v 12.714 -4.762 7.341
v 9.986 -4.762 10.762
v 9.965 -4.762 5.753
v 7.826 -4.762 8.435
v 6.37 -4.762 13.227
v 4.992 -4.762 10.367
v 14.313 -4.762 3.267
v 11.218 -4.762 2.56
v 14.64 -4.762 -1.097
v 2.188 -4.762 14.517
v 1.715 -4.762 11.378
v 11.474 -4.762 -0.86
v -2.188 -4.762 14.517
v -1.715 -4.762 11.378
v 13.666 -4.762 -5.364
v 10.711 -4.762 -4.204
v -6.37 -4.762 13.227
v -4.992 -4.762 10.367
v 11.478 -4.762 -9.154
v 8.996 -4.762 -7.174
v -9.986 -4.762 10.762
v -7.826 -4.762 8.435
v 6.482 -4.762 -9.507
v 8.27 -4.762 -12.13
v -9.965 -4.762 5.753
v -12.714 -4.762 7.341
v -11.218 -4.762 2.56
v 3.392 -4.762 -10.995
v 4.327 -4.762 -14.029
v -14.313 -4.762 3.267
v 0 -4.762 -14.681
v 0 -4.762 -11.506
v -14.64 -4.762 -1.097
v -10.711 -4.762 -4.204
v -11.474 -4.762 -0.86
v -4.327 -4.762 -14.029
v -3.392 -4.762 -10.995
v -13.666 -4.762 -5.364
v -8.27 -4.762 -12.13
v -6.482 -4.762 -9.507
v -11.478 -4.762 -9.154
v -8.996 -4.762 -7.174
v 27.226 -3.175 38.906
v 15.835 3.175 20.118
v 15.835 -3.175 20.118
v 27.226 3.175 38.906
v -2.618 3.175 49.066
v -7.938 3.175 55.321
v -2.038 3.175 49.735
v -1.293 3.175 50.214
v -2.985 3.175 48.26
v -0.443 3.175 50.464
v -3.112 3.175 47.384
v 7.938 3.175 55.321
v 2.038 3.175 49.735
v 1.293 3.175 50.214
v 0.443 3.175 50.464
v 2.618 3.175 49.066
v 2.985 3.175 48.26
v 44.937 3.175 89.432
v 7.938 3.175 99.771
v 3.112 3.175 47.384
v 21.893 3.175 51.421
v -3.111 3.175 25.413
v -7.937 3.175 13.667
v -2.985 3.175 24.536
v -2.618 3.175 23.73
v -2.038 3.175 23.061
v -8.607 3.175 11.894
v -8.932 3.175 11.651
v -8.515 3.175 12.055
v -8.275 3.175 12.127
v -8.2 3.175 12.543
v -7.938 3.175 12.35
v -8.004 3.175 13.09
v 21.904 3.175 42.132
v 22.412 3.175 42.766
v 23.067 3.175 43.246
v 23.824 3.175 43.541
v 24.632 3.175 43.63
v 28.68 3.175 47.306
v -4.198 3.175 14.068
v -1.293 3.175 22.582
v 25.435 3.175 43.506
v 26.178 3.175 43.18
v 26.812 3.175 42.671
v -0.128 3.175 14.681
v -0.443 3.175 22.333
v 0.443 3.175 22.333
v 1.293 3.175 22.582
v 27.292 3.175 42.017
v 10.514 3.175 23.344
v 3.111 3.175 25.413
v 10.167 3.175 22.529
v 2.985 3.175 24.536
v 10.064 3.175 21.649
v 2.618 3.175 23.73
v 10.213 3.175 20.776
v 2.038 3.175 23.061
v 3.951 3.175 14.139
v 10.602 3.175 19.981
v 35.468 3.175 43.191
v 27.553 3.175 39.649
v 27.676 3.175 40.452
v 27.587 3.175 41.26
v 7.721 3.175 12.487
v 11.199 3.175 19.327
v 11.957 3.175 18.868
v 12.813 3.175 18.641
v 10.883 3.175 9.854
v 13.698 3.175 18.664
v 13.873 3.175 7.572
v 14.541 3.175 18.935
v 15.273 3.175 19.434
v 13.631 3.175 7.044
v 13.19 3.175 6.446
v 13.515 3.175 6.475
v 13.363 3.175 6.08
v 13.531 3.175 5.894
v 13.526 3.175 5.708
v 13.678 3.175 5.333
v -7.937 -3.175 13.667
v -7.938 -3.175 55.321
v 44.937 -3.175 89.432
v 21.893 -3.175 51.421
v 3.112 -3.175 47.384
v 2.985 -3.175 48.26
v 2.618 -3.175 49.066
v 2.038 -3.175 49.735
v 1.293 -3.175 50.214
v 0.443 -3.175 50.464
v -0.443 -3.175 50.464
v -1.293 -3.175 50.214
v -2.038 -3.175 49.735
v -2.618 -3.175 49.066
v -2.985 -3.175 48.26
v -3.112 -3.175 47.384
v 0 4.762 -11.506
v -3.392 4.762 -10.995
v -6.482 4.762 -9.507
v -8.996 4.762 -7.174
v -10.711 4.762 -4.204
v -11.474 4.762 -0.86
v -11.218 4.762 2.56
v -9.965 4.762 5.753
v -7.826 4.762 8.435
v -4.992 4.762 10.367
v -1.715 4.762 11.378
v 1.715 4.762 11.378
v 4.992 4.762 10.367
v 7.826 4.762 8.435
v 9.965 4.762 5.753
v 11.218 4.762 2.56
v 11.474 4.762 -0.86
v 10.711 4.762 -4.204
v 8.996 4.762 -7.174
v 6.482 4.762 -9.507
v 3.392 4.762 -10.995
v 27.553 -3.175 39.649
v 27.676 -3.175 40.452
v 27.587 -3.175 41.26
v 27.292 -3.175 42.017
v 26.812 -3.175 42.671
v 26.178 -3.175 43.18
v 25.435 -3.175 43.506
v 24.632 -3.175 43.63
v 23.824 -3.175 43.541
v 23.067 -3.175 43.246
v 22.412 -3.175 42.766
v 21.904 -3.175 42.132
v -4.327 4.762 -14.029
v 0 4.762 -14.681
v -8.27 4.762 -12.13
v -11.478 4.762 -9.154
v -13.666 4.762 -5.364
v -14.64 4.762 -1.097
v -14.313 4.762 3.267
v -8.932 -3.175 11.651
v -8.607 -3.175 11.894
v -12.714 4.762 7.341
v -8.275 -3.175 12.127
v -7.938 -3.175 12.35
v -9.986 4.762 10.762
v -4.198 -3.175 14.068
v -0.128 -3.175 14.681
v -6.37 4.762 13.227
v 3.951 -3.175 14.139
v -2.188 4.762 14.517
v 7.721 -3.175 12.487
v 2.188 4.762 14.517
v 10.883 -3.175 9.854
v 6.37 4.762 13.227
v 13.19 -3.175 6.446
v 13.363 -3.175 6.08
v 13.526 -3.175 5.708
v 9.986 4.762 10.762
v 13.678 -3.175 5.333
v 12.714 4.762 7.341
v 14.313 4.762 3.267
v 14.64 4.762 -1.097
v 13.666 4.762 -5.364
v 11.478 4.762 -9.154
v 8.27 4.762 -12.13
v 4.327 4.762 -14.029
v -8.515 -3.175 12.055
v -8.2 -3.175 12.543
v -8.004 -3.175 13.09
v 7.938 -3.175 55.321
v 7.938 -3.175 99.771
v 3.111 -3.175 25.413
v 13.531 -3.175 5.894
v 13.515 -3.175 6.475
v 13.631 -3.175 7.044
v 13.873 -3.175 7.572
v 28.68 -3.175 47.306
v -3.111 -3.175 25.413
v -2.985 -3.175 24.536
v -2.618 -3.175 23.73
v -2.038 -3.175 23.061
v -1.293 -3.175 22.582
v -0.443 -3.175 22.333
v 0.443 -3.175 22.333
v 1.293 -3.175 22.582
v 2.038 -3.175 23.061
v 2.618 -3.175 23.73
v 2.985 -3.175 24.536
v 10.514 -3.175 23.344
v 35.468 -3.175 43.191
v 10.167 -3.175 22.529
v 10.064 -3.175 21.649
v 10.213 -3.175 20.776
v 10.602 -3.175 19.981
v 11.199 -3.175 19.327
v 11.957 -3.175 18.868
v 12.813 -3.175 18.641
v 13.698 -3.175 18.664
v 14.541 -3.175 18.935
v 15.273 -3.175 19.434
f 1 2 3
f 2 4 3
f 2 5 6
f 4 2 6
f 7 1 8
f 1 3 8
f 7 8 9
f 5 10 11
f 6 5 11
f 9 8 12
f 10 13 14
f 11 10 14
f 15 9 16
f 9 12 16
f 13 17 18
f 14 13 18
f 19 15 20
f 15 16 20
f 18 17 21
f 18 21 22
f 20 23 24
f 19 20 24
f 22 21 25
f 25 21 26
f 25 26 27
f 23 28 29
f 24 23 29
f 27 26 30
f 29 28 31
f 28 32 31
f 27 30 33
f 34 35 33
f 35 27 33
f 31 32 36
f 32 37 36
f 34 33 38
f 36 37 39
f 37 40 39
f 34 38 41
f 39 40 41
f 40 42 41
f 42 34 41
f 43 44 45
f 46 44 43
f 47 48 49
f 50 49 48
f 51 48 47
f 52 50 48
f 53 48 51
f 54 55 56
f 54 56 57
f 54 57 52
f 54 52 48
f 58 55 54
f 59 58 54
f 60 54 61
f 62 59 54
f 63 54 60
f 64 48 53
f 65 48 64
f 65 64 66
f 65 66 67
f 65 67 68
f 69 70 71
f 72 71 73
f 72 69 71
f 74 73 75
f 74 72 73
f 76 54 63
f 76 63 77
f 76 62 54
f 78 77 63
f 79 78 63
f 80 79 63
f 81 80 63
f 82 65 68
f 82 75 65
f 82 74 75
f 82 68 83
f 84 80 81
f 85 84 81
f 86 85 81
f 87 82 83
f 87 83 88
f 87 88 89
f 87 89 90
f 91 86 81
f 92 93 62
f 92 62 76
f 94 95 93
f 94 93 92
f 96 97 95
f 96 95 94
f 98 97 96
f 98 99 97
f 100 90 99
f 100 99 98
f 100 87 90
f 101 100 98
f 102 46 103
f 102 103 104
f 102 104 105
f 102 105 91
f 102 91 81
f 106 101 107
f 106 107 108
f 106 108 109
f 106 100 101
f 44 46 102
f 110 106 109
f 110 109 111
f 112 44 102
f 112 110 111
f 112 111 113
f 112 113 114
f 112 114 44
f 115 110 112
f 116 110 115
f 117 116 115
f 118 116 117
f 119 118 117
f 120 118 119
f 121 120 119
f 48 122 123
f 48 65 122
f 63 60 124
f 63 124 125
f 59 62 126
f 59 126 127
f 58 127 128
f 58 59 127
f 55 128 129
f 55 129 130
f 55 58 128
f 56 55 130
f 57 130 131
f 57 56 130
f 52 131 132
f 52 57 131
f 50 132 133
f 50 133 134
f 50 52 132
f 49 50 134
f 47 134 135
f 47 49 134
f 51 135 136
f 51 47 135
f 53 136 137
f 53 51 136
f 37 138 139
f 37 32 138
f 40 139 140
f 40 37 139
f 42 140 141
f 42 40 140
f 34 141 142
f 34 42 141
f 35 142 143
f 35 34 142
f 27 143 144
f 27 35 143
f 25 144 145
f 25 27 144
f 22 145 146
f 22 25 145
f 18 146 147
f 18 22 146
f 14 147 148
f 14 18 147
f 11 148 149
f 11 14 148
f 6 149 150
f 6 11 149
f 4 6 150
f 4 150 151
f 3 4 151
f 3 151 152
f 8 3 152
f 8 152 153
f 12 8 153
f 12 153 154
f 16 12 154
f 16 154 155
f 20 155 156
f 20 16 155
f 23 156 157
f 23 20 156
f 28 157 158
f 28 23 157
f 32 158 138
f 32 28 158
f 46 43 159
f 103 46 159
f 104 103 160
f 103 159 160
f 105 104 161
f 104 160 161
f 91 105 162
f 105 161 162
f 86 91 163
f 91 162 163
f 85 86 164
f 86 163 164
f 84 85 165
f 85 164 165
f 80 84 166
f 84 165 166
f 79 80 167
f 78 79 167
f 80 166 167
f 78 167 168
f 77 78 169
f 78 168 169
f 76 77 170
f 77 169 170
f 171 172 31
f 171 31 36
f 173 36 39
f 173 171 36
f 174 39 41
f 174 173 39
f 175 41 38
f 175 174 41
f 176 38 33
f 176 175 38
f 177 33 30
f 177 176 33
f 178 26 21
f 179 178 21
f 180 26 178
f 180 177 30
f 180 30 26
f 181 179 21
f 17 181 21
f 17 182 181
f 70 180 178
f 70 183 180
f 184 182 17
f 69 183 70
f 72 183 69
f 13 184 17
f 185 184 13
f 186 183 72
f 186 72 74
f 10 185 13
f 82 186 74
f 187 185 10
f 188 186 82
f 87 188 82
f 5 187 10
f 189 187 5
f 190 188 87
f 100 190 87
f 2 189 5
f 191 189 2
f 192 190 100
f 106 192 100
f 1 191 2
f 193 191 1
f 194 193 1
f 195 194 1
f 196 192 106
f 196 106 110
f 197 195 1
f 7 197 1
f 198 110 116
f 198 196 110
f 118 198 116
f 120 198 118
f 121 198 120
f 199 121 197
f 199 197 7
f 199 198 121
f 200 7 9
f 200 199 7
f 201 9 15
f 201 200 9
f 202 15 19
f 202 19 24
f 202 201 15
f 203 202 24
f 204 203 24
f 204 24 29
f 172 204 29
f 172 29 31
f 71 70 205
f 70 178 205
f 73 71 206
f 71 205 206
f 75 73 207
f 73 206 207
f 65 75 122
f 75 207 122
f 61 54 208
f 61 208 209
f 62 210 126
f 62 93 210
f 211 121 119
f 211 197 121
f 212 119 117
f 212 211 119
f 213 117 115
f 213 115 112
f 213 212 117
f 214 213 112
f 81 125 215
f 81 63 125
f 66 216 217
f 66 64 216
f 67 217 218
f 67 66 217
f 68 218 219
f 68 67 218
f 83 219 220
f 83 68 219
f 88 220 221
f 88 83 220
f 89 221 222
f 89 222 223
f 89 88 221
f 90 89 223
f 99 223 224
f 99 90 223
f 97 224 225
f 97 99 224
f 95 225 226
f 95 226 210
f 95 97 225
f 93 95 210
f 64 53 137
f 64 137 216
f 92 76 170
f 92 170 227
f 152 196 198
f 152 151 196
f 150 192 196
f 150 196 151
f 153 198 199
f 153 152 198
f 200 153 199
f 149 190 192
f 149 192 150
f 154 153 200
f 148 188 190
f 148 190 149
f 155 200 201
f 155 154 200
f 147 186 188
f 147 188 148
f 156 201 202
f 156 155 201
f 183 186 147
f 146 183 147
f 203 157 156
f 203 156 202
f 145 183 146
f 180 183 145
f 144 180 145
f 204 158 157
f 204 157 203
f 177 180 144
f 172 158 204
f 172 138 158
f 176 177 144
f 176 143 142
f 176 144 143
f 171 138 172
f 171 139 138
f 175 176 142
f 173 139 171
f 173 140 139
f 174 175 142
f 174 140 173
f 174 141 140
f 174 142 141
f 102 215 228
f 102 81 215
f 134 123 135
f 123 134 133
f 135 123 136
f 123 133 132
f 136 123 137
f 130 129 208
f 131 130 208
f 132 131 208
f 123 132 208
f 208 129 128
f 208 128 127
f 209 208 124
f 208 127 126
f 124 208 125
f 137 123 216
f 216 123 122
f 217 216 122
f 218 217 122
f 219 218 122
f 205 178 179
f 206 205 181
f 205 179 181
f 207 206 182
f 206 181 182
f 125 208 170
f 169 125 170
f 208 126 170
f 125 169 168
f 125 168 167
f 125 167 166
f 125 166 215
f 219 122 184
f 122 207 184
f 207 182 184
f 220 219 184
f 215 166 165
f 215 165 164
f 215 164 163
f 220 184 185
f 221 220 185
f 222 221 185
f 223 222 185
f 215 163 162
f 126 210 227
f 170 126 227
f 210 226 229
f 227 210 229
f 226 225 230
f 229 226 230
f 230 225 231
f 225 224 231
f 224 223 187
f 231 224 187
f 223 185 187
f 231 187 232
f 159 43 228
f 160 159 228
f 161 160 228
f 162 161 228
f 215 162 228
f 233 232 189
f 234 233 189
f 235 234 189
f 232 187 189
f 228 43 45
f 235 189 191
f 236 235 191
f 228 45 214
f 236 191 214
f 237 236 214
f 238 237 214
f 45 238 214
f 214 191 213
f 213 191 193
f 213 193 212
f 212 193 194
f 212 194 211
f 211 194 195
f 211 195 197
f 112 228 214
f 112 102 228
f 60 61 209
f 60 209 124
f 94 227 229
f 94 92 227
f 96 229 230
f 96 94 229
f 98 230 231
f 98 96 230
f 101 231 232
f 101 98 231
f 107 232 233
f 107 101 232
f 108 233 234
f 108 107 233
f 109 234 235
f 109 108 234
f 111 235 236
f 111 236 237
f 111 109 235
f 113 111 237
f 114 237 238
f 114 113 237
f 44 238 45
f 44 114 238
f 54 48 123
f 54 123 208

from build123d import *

# Parameters (mm, degrees)
SKETCH1_R             = 14.6812
SKETCH1_R_2           = 11.5062
BEARING_EXTRUDE_DEPTH = 4.7625
BOSS_EXTRUDE2_DEPTH   = 3.175
FILLET1_R             = 2.54


with BuildPart() as part:
    # Sketch1 → Bearing extrude (new, symmetric)
    with BuildSketch(Plane(origin=(0, 0, 0), x_dir=(1, 0, 0), z_dir=(0, 1, 0))):
        with Locations(Location((0, 0, 0), (0, 0, 90))):
            Circle(SKETCH1_R)
        with Locations(Location((0, 0, 0), (0, 0, 90))):
            Circle(SKETCH1_R_2, mode=Mode.SUBTRACT)
    extrude(amount=BEARING_EXTRUDE_DEPTH, both=True)

    # Sketch1<5> → Boss-Extrude2 (add, symmetric)
    with BuildSketch(Plane(origin=(0, 0, 0), x_dir=(1, 0, 0), z_dir=(0, 1, 0))):
        with BuildLine():
            Line((-7.9375, -12.350454534), (-7.9375, -55.3212))
            Line((-7.9375, -55.3212), (7.9375, -55.3212))
            Line((7.9375, -55.3212), (7.9375, -99.7712))
            Line((7.9375, -99.7712), (44.936648924, -89.431503617))
            Line((44.936648924, -89.431503617), (21.89252839, -51.421360118))
            Line((21.89252839, -51.421360118), (28.680054014, -47.306338594))
            Line((28.680054014, -47.306338594), (35.467579639, -43.19131707))
            Line((35.467579639, -43.19131707), (13.190345938, -6.446115688))
            ThreePointArc((13.190345938, -6.446115688), (3.951379748, -14.13945655), (-7.9375, -12.350454534))
        make_face()
        with BuildLine():
            ThreePointArc((3.1115, -47.3837), (0, -50.4952), (-3.1115, -47.3837))
            Line((-3.1115, -47.3837), (-3.1115, -25.4127))
            ThreePointArc((-3.1115, -25.4127), (0, -22.3012), (3.1115, -25.4127))
            Line((3.1115, -25.4127), (3.1115, -47.3837))
        make_face(mode=Mode.SUBTRACT)
        with BuildLine():
            ThreePointArc((27.225742535, -38.905724532), (27.587064378, -41.259593312), (26.178120928, -43.179523014))
            ThreePointArc((26.178120928, -43.179523014), (23.824252147, -43.540844858), (21.904322445, -42.131901407))
            Line((21.904322445, -42.131901407), (10.513942867, -23.344030478))
            ThreePointArc((10.513942867, -23.344030478), (11.561564474, -19.070231995), (15.835362956, -20.117853603))
            Line((15.835362956, -20.117853603), (27.225742535, -38.905724532))
        make_face(mode=Mode.SUBTRACT)
    extrude(amount=BOSS_EXTRUDE2_DEPTH, both=True)

    # Fillet1
    fillet1_edges = [part.edges().sort_by_distance(p)[0] for p in [
        (13.190345938, 0, 6.446115688),
        (-7.9375, 0, 12.350454534),
    ]]
    fillet(fillet1_edges, radius=FILLET1_R)


solid = part.part
